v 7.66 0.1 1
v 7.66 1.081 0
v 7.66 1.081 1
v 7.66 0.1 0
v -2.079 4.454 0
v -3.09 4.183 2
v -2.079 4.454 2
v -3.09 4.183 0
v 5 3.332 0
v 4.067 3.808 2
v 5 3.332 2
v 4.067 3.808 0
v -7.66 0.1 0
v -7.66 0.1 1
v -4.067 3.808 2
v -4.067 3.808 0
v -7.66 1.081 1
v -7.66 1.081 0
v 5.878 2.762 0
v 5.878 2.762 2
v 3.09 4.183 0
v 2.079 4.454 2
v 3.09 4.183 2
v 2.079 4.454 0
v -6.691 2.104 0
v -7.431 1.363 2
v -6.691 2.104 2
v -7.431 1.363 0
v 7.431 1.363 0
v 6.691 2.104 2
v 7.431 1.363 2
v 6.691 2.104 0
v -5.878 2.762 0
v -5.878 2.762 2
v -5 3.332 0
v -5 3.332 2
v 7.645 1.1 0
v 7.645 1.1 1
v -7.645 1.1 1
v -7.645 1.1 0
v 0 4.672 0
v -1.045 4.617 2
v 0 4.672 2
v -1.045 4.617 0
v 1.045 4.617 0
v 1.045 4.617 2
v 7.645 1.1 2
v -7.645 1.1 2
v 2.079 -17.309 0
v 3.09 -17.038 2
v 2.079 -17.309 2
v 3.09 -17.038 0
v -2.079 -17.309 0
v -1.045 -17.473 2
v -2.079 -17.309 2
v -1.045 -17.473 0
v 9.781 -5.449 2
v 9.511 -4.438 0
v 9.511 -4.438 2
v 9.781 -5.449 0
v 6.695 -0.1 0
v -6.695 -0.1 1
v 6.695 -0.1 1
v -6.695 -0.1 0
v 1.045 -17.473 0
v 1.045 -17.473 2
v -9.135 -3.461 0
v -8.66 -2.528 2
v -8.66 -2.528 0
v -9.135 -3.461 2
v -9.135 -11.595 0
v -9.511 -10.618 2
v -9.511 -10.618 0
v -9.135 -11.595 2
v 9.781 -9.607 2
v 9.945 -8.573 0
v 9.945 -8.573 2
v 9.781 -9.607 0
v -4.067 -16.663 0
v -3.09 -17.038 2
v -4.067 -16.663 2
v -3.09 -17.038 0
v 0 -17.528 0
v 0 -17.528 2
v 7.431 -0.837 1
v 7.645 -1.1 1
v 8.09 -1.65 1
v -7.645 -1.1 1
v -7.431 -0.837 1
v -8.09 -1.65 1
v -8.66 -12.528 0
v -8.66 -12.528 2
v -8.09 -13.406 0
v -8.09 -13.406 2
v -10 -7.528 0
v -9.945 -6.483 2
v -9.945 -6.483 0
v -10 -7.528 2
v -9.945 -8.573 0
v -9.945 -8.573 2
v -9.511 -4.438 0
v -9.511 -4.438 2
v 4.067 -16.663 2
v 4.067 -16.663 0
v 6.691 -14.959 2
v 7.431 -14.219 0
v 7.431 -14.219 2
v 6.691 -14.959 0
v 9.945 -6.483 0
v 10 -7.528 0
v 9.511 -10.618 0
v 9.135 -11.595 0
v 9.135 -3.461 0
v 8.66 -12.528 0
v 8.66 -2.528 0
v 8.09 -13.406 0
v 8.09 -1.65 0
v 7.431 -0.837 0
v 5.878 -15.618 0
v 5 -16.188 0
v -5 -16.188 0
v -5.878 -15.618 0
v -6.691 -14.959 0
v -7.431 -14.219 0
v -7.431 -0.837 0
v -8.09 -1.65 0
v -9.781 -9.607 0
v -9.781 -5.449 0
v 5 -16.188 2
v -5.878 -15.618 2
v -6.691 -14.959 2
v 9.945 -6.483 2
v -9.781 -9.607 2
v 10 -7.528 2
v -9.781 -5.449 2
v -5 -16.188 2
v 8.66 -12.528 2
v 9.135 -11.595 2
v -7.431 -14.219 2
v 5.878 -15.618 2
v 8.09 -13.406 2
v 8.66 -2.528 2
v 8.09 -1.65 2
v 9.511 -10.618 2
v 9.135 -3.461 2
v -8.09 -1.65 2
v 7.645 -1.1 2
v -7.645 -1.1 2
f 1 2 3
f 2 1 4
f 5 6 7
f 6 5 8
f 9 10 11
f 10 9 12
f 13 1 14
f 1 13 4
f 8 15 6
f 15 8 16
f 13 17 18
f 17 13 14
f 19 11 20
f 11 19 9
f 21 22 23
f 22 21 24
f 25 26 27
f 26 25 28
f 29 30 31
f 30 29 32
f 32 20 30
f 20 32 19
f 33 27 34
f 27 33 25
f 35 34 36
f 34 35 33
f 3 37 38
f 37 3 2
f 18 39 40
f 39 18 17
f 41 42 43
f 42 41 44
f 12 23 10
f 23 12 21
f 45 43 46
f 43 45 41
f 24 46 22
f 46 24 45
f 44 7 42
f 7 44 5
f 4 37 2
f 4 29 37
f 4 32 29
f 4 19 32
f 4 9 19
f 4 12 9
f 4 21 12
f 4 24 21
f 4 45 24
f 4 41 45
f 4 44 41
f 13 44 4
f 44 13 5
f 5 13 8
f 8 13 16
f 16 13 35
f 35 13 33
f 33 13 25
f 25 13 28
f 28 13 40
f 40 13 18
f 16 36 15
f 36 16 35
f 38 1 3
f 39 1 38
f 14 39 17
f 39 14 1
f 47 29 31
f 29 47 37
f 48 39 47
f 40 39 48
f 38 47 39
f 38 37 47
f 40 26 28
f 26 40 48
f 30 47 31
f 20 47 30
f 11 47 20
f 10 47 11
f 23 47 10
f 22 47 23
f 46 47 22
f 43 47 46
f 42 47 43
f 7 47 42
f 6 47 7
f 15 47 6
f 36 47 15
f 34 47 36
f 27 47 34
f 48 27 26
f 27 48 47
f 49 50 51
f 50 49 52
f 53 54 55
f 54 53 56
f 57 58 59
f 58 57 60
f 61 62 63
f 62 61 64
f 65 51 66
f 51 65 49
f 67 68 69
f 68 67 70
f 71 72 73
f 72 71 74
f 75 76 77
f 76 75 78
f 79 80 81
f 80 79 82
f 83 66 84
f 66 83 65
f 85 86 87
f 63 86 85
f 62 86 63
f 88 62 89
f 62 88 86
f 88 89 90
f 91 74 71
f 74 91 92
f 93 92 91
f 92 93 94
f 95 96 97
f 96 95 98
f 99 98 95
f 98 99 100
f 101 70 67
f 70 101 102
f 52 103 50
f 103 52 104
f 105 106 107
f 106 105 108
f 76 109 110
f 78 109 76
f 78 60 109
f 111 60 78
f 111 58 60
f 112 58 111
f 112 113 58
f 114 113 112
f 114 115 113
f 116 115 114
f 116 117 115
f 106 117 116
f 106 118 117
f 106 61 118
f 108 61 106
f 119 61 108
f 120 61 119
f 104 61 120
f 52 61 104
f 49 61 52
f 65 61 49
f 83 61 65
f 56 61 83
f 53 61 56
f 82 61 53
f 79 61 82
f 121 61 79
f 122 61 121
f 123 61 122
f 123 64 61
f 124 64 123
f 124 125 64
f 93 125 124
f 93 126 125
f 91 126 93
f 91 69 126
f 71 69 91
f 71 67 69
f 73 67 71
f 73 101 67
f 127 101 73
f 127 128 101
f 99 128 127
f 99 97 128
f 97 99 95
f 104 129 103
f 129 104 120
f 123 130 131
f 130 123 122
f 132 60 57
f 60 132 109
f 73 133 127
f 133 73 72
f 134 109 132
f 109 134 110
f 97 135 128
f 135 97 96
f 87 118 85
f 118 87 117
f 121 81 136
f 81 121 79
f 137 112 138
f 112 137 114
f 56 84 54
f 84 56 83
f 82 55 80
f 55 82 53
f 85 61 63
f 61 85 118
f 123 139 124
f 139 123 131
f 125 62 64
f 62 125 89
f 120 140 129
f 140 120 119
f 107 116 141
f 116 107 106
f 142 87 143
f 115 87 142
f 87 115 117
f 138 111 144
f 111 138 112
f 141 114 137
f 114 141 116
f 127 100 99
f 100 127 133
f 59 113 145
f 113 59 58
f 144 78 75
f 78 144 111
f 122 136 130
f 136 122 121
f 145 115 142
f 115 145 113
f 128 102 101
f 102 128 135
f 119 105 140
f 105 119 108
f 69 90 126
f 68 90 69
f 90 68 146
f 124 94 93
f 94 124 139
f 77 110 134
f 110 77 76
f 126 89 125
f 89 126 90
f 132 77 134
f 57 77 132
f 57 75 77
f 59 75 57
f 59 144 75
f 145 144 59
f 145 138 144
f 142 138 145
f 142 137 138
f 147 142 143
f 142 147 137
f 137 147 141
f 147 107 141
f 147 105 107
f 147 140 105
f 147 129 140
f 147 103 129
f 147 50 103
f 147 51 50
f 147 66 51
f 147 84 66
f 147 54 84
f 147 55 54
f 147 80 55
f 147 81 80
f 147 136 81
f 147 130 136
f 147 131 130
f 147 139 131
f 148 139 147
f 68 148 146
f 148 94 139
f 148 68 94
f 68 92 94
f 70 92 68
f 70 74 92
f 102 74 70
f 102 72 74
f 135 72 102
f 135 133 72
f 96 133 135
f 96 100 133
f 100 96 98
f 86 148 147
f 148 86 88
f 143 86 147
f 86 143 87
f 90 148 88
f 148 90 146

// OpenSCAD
// Unit of length: Unit.MM
$fn = 60;
$vpr = [0.0, 0.0, 0.0];

union()
{
   translate(v = [0.0, 1.1])
   {
      union()
      {
         color(c = [1.0, 0.0, 0.0, 1.0])
         {
            linear_extrude(height = 1.0, center = false, twist = 0.0, scale = 1.0)
            {
               translate(v = [0.0, -6.4279])
               {
                  intersection()
                  {
                     circle(d = 20.0);
                     polygon(points = [[-7.6604, 5.4279], [-7.6604, 10.0], [7.6604, 10.0], [7.6604, 5.4279]]);
                  }
               }
            }
         }
         translate(v = [0.0, 0.0, 0.0])
         {
            linear_extrude(height = 2.0, center = false, twist = 0.0, scale = 1.0)
            {
               translate(v = [0.0, -6.4279])
               {
                  intersection()
                  {
                     circle(d = 20.0);
                     polygon(points = [[-7.6604, 6.4279], [-7.6604, 10.0], [7.6604, 10.0], [7.6604, 6.4279]]);
                  }
               }
            }
         }
      }
   }
   translate(v = [0.0, -1.1])
   {
      union()
      {
         color(c = [1.0, 0.0, 0.0, 1.0])
         {
            linear_extrude(height = 1.0, center = false, twist = 0.0, scale = 1.0)
            {
               translate(v = [0.0, -6.4279])
               {
                  intersection()
                  {
                     circle(d = 20.0);
                     polygon(points = [[-10.0, -10.0], [-10.0, 7.4279], [10.0, 7.4279], [10.0, -10.0]]);
                  }
               }
            }
         }
         translate(v = [0.0, 0.0, 0.0])
         {
            linear_extrude(height = 2.0, center = false, twist = 0.0, scale = 1.0)
            {
               translate(v = [0.0, -6.4279])
               {
                  intersection()
                  {
                     circle(d = 20.0);
                     polygon(points = [[-10.0, -10.0], [-10.0, 6.4279], [10.0, 6.4279], [10.0, -10.0]]);
                  }
               }
            }
         }
      }
   }
}
